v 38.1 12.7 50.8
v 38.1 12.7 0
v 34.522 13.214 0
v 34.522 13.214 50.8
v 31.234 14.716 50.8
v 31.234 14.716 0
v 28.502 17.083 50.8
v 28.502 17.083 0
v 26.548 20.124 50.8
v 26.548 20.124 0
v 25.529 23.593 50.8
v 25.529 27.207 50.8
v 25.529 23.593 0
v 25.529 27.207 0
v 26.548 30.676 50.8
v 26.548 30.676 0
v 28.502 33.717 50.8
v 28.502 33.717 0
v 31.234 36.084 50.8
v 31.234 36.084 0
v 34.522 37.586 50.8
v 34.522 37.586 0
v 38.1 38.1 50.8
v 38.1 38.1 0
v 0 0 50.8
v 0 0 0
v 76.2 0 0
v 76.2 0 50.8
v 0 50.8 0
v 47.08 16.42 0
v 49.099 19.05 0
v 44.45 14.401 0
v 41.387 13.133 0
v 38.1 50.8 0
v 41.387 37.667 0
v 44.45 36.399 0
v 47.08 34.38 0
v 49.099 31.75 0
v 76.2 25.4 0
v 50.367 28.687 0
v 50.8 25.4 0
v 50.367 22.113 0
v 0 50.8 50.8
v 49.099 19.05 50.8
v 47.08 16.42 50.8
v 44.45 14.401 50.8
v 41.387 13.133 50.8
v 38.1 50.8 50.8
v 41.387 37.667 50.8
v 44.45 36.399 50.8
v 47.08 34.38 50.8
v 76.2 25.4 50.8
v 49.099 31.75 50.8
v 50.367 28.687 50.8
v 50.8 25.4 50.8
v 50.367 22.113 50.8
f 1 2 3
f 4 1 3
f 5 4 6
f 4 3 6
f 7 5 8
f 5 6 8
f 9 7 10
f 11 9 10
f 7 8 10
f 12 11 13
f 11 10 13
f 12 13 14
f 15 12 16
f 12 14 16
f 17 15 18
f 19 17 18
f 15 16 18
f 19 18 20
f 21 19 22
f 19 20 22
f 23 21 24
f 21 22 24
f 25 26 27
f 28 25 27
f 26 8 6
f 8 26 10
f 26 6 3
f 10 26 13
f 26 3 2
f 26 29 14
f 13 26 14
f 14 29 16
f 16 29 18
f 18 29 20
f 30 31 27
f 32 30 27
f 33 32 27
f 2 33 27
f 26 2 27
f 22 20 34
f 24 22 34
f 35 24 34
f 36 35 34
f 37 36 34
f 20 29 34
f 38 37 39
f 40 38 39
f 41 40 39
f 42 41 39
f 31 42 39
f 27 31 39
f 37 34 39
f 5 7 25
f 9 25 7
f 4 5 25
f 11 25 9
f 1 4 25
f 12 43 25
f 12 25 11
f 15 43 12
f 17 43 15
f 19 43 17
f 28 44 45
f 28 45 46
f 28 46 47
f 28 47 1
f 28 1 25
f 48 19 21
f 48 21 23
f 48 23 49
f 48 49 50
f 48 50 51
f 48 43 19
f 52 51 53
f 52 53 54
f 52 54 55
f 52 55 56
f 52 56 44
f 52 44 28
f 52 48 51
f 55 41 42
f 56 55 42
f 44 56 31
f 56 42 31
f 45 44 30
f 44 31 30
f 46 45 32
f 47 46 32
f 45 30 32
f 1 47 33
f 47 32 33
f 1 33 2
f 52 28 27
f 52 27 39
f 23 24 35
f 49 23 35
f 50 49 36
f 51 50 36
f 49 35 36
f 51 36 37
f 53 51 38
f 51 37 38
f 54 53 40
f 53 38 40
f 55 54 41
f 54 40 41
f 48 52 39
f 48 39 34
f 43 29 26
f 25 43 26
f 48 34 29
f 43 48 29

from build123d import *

# Parameters (mm, degrees)
F1_DEPTH = 50.8


with BuildPart() as f1:
    # F0 (on Top) → F1 (new body)
    with BuildSketch(Plane.XY):
        with BuildLine():
            Line((38.1, 50.8), (0, 50.8))
            Line((0, 50.8), (0, 0))
            Line((0, 0), (38.1, 0))
            Line((38.1, 0), (38.1, 12.7))
            ThreePointArc((38.1, 12.7), (25.4, 25.4), (38.1, 38.1))
            Line((38.1, 38.1), (38.1, 50.8))
        make_face()
        with BuildLine():
            Line((76.2, 25.4), (38.1, 50.8))
            Line((38.1, 50.8), (38.1, 38.1))
            ThreePointArc((38.1, 38.1), (47.080256, 34.380256), (50.8, 25.4))
            Line((50.8, 25.4), (76.2, 25.4))
        make_face()
        with BuildLine():
            Line((76.2, 0), (76.2, 25.4))
            Line((76.2, 25.4), (50.8, 25.4))
            ThreePointArc((50.8, 25.4), (47.080256, 16.419744), (38.1, 12.7))
            Line((38.1, 12.7), (38.1, 0))
            Line((38.1, 0), (76.2, 0))
        make_face()
    extrude(amount=F1_DEPTH)


solid = f1.part
